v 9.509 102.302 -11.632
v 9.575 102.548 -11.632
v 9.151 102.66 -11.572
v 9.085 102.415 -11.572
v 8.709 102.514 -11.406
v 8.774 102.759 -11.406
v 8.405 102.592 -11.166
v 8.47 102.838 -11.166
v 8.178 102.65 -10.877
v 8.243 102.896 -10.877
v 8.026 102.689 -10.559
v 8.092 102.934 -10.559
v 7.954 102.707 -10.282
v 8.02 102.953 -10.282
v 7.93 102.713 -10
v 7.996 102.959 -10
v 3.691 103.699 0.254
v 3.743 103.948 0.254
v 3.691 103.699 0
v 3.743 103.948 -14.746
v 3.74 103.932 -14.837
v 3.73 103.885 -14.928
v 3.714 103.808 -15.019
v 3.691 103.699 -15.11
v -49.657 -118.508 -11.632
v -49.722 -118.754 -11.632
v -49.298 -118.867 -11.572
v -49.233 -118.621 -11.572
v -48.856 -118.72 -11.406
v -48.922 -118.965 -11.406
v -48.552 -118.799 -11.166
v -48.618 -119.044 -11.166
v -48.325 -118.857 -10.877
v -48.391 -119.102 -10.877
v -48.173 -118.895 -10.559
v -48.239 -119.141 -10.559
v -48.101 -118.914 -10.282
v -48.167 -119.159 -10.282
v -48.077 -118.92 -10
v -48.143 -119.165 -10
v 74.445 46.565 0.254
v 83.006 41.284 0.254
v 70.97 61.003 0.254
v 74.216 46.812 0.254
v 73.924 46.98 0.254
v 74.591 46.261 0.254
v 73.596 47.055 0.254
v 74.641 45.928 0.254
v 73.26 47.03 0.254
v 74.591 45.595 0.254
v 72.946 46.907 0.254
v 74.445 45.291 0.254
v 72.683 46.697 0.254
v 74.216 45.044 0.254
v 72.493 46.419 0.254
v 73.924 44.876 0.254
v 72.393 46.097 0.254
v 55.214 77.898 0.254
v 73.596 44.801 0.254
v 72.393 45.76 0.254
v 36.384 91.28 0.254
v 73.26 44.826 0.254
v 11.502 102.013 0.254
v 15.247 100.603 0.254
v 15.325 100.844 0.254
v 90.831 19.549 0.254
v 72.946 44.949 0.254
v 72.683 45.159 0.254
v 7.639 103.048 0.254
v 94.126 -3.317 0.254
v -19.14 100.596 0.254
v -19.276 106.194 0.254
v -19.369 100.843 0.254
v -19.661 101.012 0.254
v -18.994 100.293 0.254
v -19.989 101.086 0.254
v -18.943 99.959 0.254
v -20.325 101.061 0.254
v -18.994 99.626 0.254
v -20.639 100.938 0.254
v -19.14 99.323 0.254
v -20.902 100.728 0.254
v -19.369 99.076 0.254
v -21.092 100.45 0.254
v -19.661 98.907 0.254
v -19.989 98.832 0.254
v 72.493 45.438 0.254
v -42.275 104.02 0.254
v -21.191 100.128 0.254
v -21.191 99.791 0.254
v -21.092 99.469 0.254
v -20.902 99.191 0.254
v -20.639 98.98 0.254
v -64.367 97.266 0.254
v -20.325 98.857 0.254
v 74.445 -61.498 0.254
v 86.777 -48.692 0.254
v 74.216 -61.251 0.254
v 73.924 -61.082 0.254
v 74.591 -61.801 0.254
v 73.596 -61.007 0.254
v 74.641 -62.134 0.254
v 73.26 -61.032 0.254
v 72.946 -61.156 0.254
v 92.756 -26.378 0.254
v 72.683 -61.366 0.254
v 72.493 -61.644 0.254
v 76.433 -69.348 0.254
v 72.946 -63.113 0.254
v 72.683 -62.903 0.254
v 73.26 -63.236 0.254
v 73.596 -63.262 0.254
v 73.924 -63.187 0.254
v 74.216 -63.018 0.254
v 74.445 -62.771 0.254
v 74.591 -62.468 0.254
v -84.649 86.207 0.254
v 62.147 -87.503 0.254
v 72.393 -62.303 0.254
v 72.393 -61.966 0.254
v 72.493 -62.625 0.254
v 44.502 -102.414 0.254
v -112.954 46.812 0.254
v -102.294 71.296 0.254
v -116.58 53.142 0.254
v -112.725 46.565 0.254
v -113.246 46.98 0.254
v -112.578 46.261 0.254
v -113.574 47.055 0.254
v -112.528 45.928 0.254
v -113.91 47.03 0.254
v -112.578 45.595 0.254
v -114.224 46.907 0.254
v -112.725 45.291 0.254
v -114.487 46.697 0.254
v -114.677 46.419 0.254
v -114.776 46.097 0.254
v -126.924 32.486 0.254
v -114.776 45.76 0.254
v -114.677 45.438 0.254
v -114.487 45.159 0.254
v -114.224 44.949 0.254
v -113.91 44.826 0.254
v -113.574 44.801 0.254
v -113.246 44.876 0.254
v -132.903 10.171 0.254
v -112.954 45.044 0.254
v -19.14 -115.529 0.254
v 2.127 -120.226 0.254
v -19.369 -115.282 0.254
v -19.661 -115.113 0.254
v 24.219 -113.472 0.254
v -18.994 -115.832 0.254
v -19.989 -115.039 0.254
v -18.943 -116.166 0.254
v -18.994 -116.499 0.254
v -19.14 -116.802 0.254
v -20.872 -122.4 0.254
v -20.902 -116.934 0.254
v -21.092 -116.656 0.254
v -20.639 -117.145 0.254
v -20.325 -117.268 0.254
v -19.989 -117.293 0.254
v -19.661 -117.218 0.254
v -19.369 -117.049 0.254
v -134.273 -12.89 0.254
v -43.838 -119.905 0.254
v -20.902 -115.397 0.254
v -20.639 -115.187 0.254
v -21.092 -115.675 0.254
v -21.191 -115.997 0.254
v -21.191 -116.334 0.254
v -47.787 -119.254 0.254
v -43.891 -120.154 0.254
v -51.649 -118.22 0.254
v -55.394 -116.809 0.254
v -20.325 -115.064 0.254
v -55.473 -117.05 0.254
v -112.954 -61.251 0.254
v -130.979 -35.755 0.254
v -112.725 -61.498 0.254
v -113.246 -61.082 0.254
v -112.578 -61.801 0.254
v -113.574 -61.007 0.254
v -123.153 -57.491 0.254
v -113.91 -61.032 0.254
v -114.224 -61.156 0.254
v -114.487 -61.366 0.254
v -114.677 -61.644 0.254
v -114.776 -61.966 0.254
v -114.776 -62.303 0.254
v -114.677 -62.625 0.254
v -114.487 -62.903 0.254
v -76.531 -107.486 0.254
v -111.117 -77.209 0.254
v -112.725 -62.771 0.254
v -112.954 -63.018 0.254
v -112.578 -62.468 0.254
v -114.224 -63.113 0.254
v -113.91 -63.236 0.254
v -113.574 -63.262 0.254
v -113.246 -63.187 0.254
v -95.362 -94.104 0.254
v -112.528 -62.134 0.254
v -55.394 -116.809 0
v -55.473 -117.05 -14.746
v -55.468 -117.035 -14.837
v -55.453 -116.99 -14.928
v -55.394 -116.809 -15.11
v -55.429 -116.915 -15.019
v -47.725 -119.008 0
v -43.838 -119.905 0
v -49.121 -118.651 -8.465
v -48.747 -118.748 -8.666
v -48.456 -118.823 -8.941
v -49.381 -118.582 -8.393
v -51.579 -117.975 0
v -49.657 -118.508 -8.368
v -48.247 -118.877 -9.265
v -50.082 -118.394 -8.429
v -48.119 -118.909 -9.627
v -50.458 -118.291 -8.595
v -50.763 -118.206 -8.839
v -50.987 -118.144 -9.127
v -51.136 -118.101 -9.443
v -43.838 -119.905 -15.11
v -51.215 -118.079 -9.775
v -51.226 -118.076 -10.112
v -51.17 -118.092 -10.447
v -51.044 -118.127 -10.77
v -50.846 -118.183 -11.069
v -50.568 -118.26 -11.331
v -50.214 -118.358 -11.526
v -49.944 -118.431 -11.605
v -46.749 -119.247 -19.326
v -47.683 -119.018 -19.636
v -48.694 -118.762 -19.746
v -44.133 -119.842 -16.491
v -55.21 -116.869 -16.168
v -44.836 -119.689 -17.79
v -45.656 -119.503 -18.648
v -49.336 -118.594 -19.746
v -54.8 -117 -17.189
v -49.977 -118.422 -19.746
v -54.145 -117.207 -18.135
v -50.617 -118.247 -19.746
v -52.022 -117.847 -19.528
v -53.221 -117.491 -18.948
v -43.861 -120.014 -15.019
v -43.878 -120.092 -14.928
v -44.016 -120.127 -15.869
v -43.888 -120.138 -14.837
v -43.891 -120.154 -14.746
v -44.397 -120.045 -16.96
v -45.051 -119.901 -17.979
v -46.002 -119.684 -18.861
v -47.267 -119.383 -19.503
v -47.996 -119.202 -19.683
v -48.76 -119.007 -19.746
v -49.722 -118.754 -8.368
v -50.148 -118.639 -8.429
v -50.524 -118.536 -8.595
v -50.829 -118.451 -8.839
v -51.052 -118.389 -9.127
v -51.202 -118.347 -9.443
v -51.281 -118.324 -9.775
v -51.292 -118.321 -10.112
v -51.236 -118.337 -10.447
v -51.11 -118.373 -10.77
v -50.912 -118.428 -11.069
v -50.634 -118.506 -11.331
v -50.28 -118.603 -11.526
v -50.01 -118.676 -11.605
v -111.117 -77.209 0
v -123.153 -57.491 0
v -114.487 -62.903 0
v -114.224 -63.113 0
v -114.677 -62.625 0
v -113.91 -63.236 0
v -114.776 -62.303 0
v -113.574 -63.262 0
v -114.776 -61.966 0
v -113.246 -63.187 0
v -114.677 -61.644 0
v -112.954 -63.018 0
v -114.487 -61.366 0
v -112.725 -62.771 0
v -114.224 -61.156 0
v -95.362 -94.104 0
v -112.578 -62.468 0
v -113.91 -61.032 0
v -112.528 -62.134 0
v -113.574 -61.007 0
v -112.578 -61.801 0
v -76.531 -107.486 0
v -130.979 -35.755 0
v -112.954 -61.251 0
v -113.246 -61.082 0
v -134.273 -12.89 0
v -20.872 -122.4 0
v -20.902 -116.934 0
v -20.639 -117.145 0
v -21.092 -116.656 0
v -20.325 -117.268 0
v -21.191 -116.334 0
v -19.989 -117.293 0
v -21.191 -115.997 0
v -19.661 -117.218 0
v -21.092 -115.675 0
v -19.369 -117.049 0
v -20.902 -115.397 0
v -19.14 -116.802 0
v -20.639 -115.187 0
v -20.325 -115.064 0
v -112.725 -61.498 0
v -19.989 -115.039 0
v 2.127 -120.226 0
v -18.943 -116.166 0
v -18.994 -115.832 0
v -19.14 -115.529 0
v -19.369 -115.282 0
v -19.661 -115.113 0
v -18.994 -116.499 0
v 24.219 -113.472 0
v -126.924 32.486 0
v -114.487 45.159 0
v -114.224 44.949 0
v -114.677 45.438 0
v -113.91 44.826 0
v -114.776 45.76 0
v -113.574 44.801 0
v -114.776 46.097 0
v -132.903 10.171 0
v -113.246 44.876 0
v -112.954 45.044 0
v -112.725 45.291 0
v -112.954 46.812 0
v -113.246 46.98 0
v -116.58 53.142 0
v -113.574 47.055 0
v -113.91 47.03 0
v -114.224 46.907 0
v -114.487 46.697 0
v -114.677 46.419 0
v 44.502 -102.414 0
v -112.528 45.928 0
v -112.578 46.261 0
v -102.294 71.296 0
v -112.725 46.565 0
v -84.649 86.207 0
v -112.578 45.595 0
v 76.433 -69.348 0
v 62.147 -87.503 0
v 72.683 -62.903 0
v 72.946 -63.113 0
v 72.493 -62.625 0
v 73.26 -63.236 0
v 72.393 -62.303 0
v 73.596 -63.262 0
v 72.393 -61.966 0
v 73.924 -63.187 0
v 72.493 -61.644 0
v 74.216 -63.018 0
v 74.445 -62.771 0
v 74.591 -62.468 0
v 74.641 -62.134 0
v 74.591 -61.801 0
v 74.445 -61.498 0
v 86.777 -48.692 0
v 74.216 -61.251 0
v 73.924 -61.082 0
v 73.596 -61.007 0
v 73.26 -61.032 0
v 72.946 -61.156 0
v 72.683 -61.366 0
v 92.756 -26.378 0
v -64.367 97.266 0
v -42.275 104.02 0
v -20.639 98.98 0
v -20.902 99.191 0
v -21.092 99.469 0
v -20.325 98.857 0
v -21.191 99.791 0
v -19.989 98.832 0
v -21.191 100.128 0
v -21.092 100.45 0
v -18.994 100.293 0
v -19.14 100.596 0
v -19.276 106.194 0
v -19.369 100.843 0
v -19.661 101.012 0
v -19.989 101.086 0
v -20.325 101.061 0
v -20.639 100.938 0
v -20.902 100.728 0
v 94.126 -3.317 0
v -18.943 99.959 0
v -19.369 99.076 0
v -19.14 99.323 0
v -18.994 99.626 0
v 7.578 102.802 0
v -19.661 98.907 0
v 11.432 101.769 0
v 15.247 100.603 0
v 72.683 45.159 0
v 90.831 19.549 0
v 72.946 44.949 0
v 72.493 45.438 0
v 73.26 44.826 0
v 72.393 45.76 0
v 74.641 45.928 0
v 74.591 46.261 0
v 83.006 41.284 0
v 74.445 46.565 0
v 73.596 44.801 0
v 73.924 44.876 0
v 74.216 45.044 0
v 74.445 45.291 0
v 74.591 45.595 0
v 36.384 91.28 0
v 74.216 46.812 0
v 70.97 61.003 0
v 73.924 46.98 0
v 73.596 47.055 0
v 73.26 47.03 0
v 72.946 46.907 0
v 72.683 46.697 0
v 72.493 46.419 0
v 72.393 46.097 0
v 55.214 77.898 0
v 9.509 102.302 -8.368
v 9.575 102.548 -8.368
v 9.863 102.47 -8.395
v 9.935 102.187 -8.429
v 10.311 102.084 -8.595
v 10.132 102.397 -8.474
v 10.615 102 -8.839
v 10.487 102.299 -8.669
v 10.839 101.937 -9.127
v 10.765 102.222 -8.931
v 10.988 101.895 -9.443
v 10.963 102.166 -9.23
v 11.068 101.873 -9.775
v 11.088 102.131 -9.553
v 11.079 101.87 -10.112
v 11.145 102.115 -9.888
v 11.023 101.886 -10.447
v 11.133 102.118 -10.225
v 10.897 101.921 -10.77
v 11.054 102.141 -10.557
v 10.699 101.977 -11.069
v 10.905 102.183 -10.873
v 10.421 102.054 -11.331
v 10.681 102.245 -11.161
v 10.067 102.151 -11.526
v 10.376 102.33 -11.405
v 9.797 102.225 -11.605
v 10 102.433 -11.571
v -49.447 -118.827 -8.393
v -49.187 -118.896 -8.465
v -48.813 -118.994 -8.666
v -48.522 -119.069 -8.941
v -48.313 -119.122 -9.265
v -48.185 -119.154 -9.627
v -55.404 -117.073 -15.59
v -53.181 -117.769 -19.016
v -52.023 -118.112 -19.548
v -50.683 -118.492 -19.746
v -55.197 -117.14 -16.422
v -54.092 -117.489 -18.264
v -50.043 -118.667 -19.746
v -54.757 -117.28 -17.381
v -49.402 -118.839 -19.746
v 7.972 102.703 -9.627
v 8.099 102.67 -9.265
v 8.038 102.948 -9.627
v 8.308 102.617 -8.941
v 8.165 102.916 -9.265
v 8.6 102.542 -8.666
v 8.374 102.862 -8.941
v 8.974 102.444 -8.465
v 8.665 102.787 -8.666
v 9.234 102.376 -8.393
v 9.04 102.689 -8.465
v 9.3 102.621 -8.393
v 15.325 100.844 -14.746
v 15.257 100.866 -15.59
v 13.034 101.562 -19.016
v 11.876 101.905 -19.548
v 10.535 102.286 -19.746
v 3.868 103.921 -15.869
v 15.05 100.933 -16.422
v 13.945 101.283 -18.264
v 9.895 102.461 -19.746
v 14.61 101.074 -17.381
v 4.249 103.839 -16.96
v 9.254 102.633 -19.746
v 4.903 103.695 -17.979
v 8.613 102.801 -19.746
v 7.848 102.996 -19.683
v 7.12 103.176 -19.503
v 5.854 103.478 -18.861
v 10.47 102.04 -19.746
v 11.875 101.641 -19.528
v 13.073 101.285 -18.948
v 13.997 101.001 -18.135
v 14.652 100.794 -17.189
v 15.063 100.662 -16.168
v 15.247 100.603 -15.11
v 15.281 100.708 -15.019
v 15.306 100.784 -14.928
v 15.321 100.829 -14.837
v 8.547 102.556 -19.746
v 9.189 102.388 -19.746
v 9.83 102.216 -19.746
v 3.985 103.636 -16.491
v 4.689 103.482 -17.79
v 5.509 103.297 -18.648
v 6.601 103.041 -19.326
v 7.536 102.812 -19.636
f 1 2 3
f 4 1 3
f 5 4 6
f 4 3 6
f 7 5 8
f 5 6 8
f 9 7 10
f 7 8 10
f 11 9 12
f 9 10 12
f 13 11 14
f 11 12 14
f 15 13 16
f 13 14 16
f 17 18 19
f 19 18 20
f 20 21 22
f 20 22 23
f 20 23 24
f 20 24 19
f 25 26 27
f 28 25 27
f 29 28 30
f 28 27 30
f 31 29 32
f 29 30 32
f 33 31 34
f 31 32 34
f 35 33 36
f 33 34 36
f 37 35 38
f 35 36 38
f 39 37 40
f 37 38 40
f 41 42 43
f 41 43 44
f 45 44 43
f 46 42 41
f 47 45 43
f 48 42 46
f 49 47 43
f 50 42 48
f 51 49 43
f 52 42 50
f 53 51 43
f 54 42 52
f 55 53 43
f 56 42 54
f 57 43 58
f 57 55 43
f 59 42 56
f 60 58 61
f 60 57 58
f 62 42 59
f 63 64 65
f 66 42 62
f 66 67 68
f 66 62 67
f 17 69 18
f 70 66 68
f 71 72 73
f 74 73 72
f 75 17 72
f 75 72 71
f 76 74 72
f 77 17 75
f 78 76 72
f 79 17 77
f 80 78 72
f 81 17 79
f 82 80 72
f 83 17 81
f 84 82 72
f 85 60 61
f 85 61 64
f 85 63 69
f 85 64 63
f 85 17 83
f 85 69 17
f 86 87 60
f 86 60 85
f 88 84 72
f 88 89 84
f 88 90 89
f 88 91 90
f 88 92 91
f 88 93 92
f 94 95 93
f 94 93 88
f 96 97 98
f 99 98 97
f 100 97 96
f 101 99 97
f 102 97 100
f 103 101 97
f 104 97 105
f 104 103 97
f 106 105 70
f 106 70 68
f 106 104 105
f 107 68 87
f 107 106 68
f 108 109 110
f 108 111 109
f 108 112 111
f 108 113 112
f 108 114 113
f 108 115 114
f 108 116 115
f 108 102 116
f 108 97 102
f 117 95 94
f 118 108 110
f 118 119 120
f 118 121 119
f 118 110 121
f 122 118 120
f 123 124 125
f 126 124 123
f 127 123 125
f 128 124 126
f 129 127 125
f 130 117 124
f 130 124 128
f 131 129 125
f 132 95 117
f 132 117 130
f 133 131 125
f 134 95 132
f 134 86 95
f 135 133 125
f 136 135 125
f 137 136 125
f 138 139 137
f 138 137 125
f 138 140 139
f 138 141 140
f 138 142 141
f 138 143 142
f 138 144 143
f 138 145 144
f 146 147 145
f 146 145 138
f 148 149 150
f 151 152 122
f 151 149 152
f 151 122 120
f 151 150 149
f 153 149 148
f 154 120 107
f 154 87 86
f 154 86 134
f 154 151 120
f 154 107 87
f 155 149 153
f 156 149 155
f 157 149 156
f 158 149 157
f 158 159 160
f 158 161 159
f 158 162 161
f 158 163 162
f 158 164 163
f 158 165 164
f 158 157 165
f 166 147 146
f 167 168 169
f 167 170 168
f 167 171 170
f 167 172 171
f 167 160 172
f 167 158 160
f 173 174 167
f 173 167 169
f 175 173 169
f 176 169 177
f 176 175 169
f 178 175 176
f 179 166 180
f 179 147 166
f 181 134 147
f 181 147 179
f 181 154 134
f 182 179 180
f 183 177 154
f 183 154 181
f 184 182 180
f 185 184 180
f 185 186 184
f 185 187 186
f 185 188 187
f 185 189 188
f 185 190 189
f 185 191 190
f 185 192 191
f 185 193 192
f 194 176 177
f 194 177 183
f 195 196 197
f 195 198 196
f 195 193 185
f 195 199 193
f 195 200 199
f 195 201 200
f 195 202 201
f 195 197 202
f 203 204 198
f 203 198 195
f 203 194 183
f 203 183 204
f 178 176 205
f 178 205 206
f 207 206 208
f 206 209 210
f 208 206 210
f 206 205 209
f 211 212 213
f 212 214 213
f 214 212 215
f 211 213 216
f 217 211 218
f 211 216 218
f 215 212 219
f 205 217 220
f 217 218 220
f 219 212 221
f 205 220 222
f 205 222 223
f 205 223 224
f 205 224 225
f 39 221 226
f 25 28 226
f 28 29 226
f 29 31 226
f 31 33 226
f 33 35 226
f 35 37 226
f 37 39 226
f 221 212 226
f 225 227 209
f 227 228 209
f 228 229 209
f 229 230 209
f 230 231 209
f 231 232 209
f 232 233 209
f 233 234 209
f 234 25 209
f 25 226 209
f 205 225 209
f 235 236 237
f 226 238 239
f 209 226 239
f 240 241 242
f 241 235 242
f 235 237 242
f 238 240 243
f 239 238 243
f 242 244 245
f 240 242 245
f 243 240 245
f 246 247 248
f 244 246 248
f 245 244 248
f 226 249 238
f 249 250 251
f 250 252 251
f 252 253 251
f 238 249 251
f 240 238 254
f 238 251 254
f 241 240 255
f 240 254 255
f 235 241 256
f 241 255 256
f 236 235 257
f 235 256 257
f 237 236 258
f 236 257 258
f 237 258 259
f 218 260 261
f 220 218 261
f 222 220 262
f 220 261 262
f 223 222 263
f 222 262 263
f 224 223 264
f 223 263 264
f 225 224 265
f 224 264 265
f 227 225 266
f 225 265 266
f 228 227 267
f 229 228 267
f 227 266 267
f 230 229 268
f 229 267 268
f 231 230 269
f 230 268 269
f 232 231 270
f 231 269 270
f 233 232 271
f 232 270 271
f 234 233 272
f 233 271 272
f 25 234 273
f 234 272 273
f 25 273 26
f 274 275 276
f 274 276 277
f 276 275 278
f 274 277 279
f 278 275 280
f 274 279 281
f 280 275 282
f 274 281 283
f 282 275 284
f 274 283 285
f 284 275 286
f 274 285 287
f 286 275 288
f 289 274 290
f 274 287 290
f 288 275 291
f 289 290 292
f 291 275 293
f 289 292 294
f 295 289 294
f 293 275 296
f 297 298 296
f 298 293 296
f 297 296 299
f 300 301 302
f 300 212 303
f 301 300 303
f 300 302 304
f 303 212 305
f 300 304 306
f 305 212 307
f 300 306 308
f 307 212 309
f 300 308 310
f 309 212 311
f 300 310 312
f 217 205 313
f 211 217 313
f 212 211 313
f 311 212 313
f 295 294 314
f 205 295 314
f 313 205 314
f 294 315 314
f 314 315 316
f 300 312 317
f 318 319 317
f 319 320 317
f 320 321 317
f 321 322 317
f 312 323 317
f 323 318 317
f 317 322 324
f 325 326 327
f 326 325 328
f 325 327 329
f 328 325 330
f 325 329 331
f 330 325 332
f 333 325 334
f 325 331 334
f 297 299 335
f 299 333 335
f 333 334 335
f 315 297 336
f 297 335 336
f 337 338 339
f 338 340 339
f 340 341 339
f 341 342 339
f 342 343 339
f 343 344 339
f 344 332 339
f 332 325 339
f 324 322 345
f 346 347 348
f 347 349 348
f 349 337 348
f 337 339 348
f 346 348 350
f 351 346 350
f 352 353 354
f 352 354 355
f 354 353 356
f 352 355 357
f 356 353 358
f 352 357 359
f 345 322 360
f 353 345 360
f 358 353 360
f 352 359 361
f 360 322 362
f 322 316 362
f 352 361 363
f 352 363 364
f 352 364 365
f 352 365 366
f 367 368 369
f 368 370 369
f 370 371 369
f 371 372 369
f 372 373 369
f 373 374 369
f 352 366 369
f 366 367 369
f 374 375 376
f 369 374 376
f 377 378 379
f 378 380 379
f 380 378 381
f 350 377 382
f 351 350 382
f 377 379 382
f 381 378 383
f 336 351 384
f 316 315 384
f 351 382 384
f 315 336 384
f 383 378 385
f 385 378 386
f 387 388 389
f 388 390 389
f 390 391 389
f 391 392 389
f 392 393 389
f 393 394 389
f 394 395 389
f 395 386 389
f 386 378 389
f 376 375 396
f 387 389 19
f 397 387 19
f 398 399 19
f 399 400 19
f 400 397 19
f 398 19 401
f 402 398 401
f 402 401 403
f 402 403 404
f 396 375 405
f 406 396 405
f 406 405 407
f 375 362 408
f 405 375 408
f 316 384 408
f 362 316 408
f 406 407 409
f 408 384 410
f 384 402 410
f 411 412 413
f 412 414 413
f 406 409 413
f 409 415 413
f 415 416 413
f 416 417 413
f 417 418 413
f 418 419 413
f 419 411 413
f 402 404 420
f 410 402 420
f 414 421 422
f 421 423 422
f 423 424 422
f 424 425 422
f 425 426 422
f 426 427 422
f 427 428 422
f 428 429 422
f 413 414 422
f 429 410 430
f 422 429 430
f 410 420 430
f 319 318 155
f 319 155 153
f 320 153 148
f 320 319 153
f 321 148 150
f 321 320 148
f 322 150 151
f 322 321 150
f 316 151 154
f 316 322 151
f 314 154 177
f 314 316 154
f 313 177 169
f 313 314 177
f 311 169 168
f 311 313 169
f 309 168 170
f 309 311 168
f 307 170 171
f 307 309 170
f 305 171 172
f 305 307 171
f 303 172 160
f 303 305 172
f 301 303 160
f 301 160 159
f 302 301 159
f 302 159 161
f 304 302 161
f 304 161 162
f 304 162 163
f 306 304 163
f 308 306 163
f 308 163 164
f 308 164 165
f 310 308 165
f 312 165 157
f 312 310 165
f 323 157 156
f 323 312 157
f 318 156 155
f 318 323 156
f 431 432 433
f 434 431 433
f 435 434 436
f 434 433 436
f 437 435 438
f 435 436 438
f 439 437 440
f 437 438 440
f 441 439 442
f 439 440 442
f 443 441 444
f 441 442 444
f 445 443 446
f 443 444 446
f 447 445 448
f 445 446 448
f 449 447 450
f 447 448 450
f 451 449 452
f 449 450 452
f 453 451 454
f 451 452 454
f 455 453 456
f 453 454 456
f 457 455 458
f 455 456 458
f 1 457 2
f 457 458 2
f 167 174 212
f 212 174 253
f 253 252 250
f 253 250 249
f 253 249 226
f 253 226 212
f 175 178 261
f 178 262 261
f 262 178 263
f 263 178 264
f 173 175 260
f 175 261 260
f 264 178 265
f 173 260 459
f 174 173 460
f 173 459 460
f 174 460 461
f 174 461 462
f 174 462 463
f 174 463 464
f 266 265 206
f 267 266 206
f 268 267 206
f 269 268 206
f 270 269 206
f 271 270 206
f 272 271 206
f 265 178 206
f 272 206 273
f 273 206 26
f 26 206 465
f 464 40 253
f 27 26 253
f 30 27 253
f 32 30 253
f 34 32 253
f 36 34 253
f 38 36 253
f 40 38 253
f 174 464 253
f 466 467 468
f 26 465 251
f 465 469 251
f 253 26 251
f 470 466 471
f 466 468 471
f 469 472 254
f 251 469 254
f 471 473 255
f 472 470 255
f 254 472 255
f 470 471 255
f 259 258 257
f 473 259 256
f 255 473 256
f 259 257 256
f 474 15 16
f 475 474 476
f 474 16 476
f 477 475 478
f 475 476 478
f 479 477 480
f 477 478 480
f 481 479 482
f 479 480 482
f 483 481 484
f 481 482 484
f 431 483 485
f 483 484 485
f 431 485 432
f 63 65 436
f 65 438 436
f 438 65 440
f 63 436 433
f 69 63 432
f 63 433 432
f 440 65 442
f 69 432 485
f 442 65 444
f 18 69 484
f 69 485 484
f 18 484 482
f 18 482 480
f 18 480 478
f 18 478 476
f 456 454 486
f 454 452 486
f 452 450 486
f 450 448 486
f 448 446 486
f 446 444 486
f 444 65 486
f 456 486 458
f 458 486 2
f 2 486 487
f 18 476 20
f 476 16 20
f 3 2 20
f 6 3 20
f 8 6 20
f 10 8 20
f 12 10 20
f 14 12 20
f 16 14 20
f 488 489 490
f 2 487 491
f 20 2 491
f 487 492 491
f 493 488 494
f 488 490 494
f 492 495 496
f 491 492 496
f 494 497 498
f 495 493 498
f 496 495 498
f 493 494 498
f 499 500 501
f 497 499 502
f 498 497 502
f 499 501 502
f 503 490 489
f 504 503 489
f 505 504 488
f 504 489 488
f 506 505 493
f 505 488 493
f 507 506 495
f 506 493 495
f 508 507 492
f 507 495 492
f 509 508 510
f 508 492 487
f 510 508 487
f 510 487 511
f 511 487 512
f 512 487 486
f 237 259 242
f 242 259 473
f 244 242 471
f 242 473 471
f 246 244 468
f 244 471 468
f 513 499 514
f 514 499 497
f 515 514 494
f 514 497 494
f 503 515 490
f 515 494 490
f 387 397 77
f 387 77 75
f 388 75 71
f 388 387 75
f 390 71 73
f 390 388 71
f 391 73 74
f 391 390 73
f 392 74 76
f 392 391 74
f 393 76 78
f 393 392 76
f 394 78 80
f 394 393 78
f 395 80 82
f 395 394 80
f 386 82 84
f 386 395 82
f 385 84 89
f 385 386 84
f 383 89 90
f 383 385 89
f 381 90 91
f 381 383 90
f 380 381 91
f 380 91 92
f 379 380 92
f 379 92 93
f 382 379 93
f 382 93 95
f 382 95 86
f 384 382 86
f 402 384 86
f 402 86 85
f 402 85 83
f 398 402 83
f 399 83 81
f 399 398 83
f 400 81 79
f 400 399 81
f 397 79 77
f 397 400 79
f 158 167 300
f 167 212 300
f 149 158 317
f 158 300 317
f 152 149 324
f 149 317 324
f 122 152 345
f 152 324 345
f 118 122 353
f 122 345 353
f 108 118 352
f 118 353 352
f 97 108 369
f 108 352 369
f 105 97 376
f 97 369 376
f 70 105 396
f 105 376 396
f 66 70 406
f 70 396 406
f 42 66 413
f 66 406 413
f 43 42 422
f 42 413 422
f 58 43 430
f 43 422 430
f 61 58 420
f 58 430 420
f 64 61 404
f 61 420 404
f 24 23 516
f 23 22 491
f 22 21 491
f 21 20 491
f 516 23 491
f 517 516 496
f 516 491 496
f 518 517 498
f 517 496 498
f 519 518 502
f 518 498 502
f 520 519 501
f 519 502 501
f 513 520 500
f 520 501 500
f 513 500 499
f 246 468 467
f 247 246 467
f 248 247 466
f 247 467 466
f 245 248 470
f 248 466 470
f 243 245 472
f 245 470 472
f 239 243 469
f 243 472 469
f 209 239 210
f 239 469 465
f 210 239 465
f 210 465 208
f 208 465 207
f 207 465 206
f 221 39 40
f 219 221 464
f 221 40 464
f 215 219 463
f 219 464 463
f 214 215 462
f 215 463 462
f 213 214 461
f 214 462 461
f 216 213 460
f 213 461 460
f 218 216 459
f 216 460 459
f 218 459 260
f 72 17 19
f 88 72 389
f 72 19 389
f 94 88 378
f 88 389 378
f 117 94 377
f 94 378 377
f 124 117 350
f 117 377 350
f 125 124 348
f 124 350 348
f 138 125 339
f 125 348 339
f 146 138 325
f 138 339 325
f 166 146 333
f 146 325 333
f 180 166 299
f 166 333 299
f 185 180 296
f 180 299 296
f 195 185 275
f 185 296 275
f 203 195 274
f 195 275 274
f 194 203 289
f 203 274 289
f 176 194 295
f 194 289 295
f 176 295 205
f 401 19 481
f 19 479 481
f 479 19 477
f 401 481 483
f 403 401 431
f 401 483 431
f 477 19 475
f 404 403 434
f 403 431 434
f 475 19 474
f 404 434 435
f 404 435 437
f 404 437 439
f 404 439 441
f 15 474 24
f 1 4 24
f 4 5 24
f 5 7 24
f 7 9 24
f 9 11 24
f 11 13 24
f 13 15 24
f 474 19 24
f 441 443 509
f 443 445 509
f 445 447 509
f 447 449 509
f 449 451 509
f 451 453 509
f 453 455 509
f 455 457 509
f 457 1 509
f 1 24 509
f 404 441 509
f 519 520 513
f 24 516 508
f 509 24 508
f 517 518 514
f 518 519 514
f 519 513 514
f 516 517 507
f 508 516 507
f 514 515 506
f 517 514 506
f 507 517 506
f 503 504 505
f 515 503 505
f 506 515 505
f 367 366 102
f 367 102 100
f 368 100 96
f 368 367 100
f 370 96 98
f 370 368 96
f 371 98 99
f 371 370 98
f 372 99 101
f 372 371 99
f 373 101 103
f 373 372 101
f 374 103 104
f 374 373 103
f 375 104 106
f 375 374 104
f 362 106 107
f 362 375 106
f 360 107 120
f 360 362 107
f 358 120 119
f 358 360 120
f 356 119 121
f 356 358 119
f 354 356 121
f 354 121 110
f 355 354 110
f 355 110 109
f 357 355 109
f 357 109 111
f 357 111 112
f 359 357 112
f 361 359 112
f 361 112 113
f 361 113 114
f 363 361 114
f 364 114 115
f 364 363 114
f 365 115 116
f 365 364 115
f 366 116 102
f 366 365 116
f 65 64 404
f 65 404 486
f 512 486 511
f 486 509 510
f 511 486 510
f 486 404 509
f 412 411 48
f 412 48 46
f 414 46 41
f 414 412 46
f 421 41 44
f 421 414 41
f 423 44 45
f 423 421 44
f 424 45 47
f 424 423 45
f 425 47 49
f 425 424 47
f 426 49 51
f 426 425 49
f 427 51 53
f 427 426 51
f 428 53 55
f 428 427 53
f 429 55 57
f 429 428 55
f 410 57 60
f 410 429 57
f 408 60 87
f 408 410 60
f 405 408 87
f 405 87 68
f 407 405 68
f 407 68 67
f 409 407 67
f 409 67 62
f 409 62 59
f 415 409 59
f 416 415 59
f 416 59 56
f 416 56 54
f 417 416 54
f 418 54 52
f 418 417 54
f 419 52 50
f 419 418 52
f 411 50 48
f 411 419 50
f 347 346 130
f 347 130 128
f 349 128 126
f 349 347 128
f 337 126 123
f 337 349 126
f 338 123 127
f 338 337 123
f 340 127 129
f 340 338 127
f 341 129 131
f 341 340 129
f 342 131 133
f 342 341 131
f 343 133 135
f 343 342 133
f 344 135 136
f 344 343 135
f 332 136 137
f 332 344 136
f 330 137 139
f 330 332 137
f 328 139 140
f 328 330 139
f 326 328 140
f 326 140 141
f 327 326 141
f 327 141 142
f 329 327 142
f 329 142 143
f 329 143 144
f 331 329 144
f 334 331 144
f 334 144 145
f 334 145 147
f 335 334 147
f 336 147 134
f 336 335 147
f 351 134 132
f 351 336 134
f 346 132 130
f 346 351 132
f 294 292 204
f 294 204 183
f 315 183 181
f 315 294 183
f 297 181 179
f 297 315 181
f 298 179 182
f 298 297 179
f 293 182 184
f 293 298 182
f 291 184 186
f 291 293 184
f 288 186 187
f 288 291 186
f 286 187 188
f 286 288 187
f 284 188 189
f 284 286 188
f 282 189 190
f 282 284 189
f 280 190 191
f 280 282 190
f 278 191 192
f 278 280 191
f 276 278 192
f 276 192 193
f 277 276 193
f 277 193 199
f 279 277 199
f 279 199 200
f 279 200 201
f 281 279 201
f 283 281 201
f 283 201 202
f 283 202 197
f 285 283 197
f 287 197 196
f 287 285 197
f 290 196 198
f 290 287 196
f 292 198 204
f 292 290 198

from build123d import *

# Parameters (mm, degrees)
SKETCH1_R           = 114.3
SKETCH1_R_2         = 1.1303
BOSS_EXTRUDE1_DEPTH = 0.254
BOSS_EXTRUDE2_START = -20
BOSS_EXTRUDE2_DEPTH = 20
SKETCH3_R           = 1.63195
CUT_EXTRUDE1_DEPTH  = 268.813456051
CIRPATTERN1_COUNT   = 2


with BuildPart() as part:
    # Sketch1 → Boss-Extrude1 (new body)
    with BuildSketch(Plane.XY):
        with Locations((-20.073709177, -8.103148659)):
            Circle(SKETCH1_R)
        with Locations((-20.073709177, -116.165648659)):
            Circle(SKETCH1_R_2, mode=Mode.SUBTRACT)
        with Locations((-113.658579374, -62.134398659)):
            Circle(SKETCH1_R_2, mode=Mode.SUBTRACT)
        with Locations((73.511161019, -62.134398659)):
            Circle(SKETCH1_R_2, mode=Mode.SUBTRACT)
        with Locations((-113.658579374, 45.928101341)):
            Circle(SKETCH1_R_2, mode=Mode.SUBTRACT)
        with Locations((73.511161019, 45.928101341)):
            Circle(SKETCH1_R_2, mode=Mode.SUBTRACT)
        with Locations((-20.073709177, 99.959351341)):
            Circle(SKETCH1_R_2, mode=Mode.SUBTRACT)
    extrude(amount=BOSS_EXTRUDE1_DEPTH)

    # Sketch2 → Boss-Extrude2 (add)
    with BuildSketch(Plane.XY.offset(0.254).offset(BOSS_EXTRUDE2_START)):
        with BuildLine():
            Line((3.743406653, 103.947571596), (3.690597083, 103.699122105))
            ThreePointArc((3.690597083, 103.699122105), (9.509307678, 102.302173286), (15.24693328, 100.602611154))
            Line((15.24693328, 100.602611154), (15.325423596, 100.844179509))
            ThreePointArc((15.325423596, 100.844179509), (9.575047716, 102.547518446), (3.743406653, 103.947571596))
        make_face()
    boss_extrude2 = extrude(amount=BOSS_EXTRUDE2_DEPTH)

    # Sketch3 → Cut-Extrude1 (cut, through all)
    with BuildSketch(Plane(origin=(9.575047716, 102.547518446, 0.254), x_dir=(-0.96592582628907, 0.25881904510251436, 0), z_dir=(0.25881904510251436, 0.96592582628907, 0))):
        with Locations((0, -10.254)):
            Circle(SKETCH3_R)
        with BuildLine():
            Line((-5.995293131, -20), (-0.995293131, -20))
            ThreePointArc((-0.995293131, -20), (-4.530827037, -18.535533906), (-5.995293131, -15))
            Line((-5.995293131, -15), (-5.995293131, -20))
        make_face()
        with BuildLine():
            ThreePointArc((5.995293131, -15), (4.530827037, -18.535533906), (0.995293131, -20))
            Line((0.995293131, -20), (5.995293131, -20))
            Line((5.995293131, -20), (5.995293131, -15))
        make_face()
    cut_extrude1 = extrude(amount=-CUT_EXTRUDE1_DEPTH, mode=Mode.SUBTRACT)

    # CirPattern1: Boss-Extrude2, Cut-Extrude1 ×2 about axis
    cirpattern1_axis = Axis((-20.073709177, -8.103148659, 0.254), (0, 0, -1))
    add([boss_extrude2.rotate(cirpattern1_axis, i * 360 / CIRPATTERN1_COUNT) for i in range(1, CIRPATTERN1_COUNT)])
    add([cut_extrude1.rotate(cirpattern1_axis, i * 360 / CIRPATTERN1_COUNT) for i in range(1, CIRPATTERN1_COUNT)], mode=Mode.SUBTRACT)


solid = part.part
